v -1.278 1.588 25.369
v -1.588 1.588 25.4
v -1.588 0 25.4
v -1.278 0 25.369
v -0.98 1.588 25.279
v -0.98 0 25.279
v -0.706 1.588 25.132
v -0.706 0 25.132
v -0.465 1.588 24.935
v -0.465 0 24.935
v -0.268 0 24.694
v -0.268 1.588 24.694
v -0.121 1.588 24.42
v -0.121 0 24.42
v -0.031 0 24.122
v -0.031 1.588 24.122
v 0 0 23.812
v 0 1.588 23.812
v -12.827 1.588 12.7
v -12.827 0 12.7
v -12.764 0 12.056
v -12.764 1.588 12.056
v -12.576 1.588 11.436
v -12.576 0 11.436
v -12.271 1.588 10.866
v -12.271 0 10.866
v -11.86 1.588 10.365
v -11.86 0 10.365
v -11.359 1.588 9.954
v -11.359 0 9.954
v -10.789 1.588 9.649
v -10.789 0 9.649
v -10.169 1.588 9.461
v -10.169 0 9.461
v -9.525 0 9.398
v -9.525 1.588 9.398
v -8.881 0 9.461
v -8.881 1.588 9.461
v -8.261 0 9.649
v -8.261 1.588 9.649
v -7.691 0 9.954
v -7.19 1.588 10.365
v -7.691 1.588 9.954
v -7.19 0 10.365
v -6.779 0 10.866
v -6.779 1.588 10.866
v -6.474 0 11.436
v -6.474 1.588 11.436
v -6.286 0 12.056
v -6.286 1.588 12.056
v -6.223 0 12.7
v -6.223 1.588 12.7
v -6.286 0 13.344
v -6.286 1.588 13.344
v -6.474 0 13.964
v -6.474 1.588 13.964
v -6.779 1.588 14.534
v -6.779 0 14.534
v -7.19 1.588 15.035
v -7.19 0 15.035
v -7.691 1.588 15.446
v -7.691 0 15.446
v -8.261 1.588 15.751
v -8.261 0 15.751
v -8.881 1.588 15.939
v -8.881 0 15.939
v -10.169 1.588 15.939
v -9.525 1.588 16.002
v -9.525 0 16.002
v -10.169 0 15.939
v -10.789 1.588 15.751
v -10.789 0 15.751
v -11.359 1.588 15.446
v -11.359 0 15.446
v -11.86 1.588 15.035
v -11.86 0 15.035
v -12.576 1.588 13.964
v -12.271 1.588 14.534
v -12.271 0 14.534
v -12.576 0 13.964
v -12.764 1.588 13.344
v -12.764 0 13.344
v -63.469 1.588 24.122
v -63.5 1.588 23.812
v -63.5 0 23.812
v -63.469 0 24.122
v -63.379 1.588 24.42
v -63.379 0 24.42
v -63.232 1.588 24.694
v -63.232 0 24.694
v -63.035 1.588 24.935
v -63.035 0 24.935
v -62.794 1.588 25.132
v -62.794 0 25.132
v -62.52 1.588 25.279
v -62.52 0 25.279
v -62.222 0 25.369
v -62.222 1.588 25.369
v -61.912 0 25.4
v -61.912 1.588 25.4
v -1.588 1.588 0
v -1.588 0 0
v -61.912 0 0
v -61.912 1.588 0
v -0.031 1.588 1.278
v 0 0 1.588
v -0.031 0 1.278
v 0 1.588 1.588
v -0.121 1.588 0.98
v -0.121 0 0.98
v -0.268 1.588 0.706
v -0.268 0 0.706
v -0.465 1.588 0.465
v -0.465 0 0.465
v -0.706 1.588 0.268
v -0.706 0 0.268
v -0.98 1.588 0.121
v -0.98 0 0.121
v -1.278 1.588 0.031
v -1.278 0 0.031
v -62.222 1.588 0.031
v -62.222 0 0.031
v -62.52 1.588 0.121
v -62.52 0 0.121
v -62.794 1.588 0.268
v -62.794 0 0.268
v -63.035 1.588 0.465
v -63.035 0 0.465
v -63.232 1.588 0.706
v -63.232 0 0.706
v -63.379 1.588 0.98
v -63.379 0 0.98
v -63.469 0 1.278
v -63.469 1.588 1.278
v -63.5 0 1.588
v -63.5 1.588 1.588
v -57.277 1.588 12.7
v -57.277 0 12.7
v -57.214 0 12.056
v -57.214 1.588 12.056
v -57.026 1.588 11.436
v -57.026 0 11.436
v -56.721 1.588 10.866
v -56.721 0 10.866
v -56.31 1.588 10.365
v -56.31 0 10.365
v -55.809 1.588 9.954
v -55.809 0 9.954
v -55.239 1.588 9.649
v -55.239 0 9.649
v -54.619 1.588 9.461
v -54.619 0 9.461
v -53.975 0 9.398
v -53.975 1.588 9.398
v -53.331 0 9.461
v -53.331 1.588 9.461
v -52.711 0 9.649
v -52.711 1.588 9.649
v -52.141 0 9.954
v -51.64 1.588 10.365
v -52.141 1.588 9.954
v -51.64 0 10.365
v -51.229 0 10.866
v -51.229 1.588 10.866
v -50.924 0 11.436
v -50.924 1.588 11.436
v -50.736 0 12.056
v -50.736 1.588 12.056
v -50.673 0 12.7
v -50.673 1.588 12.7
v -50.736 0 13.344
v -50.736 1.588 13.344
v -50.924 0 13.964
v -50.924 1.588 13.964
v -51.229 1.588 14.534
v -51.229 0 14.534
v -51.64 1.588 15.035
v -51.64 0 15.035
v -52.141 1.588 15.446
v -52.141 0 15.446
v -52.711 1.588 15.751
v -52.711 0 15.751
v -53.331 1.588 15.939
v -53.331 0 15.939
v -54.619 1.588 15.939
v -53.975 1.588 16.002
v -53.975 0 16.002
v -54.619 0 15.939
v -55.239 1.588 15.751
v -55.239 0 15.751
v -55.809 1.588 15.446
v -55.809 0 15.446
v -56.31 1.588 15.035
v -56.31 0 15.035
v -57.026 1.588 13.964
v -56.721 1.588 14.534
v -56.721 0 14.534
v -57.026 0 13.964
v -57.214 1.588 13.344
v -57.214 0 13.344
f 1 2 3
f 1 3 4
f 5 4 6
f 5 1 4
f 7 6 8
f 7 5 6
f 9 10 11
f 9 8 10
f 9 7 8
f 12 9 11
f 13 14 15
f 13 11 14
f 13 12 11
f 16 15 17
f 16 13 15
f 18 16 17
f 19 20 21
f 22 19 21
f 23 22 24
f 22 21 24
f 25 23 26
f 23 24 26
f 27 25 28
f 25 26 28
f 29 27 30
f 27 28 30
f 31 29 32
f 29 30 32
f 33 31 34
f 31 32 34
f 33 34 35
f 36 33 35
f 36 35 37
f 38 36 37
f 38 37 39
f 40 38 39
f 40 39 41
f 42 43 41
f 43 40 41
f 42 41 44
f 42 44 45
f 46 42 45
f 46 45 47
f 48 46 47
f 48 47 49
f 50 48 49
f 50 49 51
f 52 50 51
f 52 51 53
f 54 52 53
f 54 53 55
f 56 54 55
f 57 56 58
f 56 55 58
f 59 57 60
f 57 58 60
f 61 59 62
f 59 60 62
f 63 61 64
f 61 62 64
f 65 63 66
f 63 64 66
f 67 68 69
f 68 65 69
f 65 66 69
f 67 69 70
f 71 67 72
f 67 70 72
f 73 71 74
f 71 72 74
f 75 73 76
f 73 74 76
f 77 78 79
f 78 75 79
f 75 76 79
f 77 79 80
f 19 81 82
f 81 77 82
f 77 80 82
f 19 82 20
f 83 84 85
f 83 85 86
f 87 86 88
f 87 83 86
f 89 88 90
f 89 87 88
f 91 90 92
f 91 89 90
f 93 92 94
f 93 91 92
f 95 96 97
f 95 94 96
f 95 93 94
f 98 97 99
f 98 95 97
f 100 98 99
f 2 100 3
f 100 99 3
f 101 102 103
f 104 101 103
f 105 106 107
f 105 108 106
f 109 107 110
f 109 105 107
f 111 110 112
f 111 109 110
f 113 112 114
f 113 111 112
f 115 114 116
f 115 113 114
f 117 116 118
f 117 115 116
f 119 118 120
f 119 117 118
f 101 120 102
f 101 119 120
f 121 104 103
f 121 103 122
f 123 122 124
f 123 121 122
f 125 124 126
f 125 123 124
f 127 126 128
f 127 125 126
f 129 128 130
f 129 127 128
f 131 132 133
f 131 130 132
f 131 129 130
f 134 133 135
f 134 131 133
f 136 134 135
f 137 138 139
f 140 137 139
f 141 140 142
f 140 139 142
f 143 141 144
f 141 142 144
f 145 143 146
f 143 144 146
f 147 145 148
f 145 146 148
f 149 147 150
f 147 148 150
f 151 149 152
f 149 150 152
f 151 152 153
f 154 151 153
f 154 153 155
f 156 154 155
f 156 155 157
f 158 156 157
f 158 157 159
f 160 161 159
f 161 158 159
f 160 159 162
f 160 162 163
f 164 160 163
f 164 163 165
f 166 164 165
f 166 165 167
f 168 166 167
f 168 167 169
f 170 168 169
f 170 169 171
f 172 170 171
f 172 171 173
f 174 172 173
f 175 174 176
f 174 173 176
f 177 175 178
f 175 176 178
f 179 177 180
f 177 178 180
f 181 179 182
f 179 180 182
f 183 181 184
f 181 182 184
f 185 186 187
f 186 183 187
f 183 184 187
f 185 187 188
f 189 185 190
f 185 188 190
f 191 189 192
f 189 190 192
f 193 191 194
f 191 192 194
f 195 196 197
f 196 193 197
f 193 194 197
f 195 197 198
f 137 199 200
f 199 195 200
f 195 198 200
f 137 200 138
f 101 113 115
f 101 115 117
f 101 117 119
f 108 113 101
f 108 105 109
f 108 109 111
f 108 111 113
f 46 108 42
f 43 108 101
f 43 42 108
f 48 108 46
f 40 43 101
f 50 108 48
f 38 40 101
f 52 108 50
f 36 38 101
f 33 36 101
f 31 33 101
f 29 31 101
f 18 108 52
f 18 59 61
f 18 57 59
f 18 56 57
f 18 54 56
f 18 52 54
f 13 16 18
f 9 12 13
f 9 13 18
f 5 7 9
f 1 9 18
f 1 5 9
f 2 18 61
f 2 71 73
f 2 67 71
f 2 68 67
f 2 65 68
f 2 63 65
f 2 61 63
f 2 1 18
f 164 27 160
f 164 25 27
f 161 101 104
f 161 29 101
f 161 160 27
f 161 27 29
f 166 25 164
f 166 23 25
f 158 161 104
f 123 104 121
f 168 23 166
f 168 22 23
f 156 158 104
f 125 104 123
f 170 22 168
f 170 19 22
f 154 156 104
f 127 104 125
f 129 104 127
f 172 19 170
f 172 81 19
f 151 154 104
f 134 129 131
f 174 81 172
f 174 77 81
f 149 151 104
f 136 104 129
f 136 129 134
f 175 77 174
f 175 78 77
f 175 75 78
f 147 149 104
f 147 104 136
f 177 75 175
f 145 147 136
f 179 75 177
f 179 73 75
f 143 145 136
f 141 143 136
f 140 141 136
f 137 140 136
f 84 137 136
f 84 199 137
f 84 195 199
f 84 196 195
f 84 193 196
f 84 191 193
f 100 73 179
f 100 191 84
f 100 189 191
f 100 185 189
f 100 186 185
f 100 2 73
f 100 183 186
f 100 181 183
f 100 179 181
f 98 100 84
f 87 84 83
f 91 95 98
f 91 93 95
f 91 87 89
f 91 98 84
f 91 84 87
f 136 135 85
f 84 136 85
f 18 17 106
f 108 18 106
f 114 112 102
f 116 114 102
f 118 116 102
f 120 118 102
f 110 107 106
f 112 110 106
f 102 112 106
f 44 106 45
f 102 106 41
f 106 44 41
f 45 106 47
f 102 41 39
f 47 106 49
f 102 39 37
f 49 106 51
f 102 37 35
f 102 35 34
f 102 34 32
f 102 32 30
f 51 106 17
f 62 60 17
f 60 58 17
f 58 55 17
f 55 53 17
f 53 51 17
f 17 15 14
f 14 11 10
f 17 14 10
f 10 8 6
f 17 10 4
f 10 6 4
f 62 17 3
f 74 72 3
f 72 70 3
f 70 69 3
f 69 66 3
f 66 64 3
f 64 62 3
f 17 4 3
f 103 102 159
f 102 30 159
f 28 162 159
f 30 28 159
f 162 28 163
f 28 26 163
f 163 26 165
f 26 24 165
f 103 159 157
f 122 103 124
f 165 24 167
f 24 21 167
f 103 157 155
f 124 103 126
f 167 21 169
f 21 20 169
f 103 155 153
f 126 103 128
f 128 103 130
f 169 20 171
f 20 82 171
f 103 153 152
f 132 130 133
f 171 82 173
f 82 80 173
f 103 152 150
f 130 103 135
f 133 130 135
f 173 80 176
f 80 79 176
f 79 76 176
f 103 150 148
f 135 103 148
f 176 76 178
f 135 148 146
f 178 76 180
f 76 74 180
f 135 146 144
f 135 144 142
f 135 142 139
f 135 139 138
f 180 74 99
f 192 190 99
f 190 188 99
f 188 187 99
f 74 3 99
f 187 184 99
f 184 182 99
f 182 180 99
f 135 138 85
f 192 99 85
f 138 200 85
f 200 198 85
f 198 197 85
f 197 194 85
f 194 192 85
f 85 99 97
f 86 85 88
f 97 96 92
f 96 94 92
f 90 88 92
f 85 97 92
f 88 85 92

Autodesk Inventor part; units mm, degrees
ref_plane "YZ Plane" through (0, 0, 0) normal (1, 0, 0) x (0, 1, 0)
ref_plane "XZ Plane" through (0, 0, 0) normal (0, 1, 0) x (-1, 0, 0)
ref_plane "XY Plane" through (0, 0, 0) normal (0, 0, 1) x (1, 0, 0)
sketch "Sketch1" plane through (0, 0, 0) normal (0, 1, 0) x (-1, 0, 0)
  line L0 (0, 0) -> (63.5, 0)
  line L1 (63.5, 0) -> (63.5, 25.4)
  line L2 (63.5, 25.4) -> (0, 25.4)
  line L3 (0, 25.4) -> (0, 0)
  circle A0 centre (9.525, 12.7) radius 3.302
  circle A1 centre (53.975, 12.7) radius 3.302
  line L4 (9.525, 12.7) -> (53.975, 12.7) construction
  line L5 (31.75, 25.4) -> (31.75, 0) construction
  point P0 (31.75, 12.7)
  dimension "d0" = 63.5
  dimension "d2" = 25.4
  dimension "d3" = 44.45
  dimension "d4" = 6.604
extrude "Extrusion1" add sketch "Sketch1" along normal blind 1.5875
fillet "Fillet1" radius 1.5875 4 edges at (0, 0.7937, 25.4) (0, 0.7937, 0) (-63.5, 0.7937, 0) (-63.5, 0.7937, 25.4)
properties part number "Wheel Drop Down Plate" material "Aluminum 6061"
